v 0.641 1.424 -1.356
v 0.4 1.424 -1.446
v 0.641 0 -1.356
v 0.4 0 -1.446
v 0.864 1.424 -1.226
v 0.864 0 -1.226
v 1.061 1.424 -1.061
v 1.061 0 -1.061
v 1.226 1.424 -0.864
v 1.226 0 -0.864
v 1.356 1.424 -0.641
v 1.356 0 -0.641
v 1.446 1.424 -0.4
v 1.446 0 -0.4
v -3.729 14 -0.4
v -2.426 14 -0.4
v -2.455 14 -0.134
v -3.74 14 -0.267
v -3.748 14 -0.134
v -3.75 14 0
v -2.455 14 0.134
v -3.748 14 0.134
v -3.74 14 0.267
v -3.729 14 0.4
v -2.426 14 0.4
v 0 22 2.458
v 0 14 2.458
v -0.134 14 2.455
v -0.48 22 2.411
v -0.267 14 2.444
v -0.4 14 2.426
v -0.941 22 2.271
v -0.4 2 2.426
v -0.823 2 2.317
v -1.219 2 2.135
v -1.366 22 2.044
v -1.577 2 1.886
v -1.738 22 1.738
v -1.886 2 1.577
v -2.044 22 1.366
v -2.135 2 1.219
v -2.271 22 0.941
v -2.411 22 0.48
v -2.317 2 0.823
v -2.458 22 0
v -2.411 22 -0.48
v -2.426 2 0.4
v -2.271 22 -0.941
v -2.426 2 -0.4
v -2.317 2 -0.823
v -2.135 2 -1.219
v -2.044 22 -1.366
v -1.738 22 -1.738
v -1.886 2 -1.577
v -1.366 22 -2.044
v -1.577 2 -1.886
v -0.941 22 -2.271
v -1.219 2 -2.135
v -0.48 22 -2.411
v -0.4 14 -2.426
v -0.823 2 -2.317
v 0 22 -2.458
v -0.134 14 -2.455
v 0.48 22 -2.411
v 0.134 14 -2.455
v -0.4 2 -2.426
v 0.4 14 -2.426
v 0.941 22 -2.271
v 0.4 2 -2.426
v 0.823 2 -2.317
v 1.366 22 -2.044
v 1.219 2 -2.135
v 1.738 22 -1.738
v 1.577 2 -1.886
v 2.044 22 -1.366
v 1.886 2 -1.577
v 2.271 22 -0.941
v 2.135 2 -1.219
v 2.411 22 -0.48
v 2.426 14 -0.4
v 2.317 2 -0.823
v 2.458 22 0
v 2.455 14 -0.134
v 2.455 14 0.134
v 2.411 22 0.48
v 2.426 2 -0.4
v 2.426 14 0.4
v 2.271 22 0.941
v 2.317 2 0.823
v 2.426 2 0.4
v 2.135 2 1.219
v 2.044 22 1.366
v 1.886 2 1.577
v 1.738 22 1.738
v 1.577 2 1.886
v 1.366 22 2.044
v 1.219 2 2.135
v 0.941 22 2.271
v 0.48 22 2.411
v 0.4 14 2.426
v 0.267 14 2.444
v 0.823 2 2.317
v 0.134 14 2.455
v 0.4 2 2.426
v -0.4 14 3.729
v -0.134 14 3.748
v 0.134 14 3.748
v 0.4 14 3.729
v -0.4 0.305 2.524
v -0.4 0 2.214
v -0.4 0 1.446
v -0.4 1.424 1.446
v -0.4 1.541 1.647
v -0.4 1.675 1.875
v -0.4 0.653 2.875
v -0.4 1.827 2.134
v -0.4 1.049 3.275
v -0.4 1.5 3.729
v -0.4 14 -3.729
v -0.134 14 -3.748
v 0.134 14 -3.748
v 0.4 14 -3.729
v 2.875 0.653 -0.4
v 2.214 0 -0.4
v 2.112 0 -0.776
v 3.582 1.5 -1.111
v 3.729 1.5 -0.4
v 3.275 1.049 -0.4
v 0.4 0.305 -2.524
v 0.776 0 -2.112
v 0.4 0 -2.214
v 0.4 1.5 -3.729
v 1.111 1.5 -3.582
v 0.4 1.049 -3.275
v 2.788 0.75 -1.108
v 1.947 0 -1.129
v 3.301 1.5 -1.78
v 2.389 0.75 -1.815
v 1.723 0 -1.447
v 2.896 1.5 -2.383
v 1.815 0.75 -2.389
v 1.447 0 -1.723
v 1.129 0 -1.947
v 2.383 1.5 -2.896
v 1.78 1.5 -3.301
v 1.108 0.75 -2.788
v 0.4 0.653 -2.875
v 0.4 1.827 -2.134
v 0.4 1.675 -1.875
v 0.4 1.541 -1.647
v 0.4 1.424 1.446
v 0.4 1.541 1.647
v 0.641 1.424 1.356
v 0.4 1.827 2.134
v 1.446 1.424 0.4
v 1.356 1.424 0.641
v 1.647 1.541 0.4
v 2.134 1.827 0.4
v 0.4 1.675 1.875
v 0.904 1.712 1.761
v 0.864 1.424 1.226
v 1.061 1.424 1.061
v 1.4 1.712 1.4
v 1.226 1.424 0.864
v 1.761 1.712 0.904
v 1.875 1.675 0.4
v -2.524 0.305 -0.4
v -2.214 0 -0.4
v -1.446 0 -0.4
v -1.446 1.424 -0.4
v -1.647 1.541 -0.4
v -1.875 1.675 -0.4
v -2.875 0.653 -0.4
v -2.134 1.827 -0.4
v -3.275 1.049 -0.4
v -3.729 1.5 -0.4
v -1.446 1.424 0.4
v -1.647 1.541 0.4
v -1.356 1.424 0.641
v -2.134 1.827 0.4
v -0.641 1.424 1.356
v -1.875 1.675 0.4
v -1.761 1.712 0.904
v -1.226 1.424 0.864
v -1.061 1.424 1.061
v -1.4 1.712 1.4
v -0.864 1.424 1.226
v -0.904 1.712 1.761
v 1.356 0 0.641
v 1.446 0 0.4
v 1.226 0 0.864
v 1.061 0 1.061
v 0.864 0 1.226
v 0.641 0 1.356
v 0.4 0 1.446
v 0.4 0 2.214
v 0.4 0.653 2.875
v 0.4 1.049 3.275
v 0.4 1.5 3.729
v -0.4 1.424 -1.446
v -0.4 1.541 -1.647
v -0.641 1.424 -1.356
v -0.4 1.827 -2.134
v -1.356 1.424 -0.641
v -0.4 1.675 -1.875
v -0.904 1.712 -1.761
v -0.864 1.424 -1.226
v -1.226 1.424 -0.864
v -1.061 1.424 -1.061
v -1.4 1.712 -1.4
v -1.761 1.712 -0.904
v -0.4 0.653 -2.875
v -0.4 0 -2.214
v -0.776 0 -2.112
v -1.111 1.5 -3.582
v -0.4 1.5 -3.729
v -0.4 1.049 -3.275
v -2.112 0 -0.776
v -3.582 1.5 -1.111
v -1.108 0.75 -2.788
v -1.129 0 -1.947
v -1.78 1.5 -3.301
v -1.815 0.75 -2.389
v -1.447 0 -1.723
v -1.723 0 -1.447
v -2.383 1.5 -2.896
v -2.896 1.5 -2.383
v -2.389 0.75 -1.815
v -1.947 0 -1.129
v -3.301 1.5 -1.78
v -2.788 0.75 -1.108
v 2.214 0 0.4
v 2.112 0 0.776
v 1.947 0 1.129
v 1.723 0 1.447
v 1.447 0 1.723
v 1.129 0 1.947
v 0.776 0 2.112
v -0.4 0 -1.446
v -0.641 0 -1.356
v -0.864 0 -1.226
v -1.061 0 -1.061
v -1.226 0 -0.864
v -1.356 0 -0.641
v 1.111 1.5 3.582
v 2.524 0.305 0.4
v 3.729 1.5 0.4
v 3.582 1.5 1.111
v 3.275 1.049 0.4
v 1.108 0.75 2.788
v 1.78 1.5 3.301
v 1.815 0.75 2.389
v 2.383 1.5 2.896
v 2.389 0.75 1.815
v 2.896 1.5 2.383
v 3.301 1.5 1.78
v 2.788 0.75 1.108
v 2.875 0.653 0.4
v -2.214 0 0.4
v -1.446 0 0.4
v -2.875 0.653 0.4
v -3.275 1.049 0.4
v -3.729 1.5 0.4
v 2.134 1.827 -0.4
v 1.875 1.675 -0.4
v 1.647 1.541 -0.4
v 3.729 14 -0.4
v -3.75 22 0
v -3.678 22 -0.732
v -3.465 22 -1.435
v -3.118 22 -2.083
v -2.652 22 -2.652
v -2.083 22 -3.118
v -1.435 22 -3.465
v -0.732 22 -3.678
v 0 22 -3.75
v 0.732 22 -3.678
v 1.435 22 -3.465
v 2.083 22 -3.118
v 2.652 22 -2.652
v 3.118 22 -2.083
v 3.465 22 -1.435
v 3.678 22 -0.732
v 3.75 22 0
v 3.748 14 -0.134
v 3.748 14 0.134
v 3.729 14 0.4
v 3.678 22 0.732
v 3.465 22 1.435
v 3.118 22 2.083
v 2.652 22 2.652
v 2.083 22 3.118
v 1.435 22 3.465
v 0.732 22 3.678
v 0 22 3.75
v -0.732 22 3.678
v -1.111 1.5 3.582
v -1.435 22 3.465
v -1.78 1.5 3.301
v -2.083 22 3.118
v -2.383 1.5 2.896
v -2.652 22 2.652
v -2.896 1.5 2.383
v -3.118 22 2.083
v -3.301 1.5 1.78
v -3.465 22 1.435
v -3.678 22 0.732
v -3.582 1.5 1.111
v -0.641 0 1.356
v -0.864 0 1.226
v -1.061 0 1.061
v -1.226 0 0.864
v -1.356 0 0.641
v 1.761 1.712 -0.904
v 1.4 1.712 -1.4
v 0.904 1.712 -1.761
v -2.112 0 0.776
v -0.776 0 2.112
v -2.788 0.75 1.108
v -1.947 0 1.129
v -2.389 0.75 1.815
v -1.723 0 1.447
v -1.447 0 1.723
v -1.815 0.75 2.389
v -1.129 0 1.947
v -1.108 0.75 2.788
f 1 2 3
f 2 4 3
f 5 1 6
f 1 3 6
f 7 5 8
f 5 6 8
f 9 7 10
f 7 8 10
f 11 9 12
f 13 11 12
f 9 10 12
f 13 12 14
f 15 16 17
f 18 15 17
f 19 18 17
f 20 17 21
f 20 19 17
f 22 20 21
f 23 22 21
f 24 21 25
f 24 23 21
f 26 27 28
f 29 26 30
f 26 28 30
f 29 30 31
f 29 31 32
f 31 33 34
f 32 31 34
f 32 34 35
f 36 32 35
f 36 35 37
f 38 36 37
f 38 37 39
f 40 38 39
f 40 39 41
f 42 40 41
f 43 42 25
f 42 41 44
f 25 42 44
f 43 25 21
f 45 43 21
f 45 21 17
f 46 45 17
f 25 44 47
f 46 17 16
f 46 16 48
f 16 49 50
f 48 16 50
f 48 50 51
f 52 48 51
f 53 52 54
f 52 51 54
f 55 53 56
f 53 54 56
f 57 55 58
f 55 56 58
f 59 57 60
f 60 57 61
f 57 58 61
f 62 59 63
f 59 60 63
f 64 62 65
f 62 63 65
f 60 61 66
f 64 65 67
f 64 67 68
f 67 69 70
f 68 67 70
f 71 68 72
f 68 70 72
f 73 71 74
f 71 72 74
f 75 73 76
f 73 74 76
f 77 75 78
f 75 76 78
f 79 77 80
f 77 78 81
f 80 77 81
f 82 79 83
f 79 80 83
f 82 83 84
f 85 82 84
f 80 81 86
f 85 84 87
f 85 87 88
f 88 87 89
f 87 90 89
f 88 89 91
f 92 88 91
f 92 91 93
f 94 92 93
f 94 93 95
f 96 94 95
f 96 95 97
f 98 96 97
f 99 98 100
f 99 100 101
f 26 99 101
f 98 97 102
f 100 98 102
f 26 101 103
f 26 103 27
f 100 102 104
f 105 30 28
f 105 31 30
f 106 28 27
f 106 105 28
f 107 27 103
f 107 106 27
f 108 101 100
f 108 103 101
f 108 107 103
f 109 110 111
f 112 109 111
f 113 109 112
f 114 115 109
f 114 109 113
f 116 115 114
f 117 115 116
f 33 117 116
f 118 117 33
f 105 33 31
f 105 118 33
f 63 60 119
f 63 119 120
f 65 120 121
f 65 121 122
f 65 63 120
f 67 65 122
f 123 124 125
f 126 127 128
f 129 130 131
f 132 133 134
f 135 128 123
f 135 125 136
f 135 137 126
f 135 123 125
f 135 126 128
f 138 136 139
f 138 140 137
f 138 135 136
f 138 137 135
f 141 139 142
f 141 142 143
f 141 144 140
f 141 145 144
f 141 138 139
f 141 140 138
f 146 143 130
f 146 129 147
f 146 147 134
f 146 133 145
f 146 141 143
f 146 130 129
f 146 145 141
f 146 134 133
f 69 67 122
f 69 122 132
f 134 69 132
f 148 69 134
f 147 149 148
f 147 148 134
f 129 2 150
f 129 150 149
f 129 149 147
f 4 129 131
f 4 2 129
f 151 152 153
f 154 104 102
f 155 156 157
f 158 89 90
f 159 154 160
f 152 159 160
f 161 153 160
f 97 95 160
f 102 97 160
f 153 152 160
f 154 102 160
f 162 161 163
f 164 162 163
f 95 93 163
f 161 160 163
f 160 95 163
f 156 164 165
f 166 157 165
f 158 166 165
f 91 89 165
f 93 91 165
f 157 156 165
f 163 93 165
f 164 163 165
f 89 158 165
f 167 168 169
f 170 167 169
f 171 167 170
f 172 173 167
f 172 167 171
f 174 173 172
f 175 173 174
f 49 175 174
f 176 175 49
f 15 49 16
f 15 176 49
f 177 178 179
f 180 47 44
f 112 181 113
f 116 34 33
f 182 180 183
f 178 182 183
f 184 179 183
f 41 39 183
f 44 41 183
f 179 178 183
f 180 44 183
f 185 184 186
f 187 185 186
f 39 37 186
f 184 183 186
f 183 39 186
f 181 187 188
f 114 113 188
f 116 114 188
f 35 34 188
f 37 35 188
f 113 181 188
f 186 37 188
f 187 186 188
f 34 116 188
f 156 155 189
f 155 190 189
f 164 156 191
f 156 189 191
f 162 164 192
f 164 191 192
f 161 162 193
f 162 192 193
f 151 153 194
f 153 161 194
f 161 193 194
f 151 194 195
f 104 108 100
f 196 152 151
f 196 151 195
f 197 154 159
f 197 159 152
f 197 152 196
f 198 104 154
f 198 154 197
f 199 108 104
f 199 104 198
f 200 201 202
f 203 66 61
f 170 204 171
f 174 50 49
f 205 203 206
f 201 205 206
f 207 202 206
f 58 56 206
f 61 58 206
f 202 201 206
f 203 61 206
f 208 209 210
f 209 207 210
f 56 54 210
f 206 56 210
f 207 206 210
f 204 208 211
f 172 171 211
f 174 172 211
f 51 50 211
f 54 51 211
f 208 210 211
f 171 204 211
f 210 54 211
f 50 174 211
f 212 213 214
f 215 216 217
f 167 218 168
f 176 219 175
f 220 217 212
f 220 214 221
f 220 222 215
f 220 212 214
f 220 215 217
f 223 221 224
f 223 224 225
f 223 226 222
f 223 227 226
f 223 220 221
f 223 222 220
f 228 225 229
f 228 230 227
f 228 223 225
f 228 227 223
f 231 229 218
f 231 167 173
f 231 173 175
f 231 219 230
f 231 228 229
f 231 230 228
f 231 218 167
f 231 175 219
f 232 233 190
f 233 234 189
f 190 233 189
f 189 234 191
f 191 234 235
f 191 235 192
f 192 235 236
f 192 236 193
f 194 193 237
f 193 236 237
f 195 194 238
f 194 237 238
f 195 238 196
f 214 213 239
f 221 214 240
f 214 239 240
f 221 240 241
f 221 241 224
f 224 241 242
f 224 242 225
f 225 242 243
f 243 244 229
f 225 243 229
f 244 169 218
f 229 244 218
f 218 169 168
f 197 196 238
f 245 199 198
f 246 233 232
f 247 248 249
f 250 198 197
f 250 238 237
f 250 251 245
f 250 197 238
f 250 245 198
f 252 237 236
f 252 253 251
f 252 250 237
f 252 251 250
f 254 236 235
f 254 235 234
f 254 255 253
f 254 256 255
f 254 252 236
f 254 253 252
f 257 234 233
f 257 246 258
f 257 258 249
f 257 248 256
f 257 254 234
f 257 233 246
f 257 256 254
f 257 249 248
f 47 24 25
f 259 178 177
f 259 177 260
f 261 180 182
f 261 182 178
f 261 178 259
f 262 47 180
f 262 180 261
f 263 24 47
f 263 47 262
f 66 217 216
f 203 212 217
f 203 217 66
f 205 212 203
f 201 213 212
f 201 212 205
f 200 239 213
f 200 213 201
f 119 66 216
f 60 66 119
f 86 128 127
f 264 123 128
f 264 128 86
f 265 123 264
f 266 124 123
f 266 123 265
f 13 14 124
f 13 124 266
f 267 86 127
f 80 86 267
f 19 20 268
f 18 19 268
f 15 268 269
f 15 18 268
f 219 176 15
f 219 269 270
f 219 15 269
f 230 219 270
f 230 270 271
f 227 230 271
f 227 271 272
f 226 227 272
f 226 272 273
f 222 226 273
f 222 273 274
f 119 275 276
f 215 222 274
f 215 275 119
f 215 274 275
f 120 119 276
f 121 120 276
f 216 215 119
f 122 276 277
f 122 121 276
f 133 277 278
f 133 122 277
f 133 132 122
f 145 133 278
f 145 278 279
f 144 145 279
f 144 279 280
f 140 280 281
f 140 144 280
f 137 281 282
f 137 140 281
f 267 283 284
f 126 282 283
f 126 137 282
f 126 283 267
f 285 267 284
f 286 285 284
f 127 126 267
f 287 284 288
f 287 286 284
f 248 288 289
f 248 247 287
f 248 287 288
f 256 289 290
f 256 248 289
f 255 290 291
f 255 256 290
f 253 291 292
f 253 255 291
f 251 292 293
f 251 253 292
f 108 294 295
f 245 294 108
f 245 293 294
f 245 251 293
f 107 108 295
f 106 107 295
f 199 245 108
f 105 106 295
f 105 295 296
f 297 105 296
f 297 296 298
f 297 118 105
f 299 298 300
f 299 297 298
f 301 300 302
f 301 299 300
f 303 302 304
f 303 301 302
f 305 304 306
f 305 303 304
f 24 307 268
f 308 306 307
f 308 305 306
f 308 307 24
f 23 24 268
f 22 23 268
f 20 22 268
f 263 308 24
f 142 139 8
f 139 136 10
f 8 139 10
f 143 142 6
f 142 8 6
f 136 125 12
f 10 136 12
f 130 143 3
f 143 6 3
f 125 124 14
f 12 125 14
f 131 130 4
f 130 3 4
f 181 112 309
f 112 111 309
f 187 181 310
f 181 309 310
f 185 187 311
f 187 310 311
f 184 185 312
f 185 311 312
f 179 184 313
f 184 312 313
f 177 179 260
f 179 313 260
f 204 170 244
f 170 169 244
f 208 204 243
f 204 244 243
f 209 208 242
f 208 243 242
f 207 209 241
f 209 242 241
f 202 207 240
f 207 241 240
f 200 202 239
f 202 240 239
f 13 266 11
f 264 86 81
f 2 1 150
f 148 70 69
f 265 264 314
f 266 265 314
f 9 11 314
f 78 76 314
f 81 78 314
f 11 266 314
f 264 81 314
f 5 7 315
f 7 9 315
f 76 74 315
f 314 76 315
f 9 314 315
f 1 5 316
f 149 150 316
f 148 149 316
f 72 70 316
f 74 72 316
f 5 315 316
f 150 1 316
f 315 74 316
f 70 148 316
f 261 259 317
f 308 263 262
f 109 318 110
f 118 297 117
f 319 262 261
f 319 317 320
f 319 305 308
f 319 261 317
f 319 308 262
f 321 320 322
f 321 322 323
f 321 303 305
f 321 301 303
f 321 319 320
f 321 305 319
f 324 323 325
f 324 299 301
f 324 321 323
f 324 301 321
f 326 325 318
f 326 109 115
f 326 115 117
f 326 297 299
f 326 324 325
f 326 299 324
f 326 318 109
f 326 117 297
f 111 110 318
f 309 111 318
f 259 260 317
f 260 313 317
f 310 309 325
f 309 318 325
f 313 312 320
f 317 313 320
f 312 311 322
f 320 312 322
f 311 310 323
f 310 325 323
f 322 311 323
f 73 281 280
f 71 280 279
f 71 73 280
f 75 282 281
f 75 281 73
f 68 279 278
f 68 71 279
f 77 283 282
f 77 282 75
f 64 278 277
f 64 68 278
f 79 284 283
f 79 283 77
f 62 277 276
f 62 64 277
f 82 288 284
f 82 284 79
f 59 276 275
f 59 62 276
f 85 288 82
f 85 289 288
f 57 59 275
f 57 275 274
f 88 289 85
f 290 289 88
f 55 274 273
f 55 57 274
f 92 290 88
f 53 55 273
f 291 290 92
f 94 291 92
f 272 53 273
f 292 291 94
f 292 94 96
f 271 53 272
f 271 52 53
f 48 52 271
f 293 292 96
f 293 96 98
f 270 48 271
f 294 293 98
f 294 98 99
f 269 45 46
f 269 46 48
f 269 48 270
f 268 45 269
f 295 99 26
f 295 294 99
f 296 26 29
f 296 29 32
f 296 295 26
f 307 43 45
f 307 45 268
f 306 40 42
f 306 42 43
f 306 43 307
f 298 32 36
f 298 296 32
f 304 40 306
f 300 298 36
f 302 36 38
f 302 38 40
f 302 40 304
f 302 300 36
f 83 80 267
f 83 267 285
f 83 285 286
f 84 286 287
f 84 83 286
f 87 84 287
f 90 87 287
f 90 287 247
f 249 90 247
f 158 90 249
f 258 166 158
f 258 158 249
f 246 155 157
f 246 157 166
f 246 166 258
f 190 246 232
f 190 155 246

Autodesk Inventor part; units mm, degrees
ref_plane "YZ Plane" through (0, 0, 0) normal (1, 0, 0) x (0, 1, 0)
ref_plane "XZ Plane" through (0, 0, 0) normal (0, 1, 0) x (-1, 0, 0)
ref_plane "XY Plane" through (0, 0, 0) normal (0, 0, 1) x (1, 0, 0)
sketch "Sketch1" plane through (0, 0, 0) normal (0, 1, 0) x (-1, 0, 0)
  circle A0 centre (0, 0) radius 3.75
  dimension "d0" = 7.5
extrude "Extrusion1" add sketch "Sketch1" along normal blind 22
sketch "Sketch2" plane through (0, 22, 0) normal (0, 1, 0) x (1, 0, 0)
  circle A0 centre (0, 0) radius 3.75 projected
hole "Hole1" at (0, 22, 0) direction (0, -1, 0) diameter 4.917 depth 20 tip angle 118 thread size "M6x1" class "6H" standard "ISO Metric profile"
chamfer "Chamfer1" distance 1.5 angle 45 1 edges at (3.75, 0, 0)
sketch "Sketch4" plane through (0, 0, 0) normal (1, 0, 0) x (0, 1, 0)
  line L0 (0, -2.25) -> (0, 2.25) projected
  line L1 (0, -0.4) -> (14, -0.4)
  line L2 (14, -0.4) -> (14, 0.4)
  line L3 (14, 0.4) -> (0, 0.4)
  line L4 (0, 0.4) -> (0, -0.4)
  point P0 (0, 0)
  point P1 (0, 0.4)
  dimension "d19" = 0.8
  dimension "d20" = 0.4
  dimension "d21" = 14
sketch "Sketch5" plane through (0, 0, 0) normal (0, -1, 0) x (1, 0, 0)
  circle A0 centre (0, 0) radius 1.5
  dimension "d16" = 3
extrude "Extrusion3" cut sketch "Sketch5" against normal through all
extrude "Extrusion4" cut sketch "Sketch4" along normal through all both and the other way through all
pattern_circular "Circular Pattern1" count 4 over 360 about axis through (0, 0, 0) along (0, 1, 0) of "Extrusion4"
equation "\"d20\" = 0.5 * d19"
properties part number "clamping_insert"
